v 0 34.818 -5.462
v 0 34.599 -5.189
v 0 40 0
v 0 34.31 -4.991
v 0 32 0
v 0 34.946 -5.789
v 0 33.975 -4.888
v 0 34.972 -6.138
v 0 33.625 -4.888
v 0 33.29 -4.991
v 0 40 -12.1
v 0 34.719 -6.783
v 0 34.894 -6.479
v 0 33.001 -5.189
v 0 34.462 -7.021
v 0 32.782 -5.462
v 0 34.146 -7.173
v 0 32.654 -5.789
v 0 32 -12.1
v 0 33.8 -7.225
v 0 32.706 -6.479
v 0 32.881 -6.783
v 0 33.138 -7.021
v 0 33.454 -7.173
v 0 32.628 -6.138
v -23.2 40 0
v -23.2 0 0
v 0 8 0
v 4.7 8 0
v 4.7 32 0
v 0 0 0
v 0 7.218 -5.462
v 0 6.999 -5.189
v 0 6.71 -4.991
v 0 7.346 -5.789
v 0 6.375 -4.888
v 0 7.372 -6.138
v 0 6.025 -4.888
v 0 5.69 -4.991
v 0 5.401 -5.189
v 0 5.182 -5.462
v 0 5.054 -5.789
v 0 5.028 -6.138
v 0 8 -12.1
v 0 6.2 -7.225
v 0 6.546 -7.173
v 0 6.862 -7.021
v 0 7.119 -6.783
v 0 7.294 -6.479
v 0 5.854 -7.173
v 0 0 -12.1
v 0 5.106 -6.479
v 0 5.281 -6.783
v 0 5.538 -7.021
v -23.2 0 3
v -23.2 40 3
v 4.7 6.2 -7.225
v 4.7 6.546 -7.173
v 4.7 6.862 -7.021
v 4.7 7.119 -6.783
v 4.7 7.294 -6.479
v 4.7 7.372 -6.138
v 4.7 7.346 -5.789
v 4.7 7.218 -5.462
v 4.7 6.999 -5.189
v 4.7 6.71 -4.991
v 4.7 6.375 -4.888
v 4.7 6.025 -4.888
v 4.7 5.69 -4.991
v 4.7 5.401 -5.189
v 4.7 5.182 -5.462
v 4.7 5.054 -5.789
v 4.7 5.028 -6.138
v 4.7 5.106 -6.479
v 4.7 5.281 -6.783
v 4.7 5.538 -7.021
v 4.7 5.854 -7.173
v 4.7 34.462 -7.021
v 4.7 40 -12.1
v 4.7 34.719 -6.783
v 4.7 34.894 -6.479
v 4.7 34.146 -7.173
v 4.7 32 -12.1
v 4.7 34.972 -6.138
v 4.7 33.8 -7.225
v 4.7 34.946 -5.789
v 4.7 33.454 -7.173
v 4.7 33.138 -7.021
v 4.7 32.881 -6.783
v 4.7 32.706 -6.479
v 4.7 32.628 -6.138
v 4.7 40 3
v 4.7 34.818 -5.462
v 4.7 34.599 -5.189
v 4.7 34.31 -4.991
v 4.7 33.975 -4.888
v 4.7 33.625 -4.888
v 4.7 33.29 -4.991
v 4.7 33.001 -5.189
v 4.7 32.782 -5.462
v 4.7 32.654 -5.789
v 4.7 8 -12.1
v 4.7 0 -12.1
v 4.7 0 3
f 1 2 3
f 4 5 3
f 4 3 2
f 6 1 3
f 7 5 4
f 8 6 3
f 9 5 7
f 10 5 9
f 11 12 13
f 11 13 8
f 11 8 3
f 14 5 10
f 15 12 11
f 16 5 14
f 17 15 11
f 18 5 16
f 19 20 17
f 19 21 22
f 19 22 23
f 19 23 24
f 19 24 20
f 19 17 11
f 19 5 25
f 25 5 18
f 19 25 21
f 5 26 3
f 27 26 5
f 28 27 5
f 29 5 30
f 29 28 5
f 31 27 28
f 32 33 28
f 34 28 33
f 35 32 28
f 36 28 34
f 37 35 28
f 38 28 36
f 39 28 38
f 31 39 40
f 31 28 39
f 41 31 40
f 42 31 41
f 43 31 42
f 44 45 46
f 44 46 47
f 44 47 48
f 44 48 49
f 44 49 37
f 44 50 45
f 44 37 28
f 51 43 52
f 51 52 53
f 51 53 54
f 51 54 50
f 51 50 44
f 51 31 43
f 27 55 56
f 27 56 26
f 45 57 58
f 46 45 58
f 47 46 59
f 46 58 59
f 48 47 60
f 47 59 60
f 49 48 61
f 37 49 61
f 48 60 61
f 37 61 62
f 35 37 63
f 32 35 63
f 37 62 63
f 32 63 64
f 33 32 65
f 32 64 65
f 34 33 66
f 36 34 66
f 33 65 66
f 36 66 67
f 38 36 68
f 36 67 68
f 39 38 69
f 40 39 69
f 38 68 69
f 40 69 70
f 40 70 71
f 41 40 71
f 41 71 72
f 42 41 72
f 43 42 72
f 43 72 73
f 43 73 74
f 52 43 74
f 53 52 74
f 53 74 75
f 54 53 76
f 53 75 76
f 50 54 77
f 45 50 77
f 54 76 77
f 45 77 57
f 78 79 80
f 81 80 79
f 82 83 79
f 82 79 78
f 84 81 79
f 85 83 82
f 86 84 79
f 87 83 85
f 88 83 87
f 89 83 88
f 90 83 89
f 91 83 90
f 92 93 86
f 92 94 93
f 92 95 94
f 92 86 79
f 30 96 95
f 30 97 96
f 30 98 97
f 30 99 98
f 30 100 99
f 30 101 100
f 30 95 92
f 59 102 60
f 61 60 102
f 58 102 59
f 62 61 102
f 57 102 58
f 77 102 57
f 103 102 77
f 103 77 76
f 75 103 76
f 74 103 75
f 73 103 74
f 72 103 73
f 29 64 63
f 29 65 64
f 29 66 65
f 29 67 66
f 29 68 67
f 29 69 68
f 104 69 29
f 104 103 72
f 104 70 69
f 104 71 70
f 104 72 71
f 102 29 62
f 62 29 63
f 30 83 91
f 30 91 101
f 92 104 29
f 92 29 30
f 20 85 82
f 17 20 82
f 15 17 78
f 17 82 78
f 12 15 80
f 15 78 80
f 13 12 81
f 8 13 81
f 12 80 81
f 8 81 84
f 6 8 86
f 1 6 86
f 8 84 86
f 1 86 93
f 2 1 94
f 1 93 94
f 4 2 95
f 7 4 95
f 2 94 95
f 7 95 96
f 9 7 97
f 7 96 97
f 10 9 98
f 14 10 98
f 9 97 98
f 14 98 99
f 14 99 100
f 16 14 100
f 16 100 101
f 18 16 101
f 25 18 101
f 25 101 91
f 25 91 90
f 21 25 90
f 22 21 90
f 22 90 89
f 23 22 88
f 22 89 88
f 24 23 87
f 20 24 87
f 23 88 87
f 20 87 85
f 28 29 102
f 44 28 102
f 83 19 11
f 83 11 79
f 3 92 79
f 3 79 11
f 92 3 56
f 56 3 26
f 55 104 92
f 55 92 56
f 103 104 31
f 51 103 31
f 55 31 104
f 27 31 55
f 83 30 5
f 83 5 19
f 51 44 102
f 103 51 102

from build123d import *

# Parameters (mm, degrees)
BOSS_EXTRUDE1_DEPTH = 40
SKETCH2_W           = 12.1
SKETCH2_H           = 24
CUT_EXTRUDE3_DEPTH  = 4.7
SKETCH4_R           = 1.175
CUT_EXTRUDE4_DEPTH  = 4.7


with BuildPart() as part:
    # Sketch1 → Boss-Extrude1 (new body)
    with BuildSketch(Plane(origin=(0, 0, 0), x_dir=(1, 0, 0), z_dir=(0, 1, 0))):
        Polygon((0, 12.1), (4.7, 12.1), (4.7, -3), (-23.2, -3), (-23.2, 0), (0, 0), align=None)
    extrude(amount=BOSS_EXTRUDE1_DEPTH)

    # Sketch2 → Cut-Extrude3 (cut)
    with BuildSketch(Plane(origin=(4.7, 0, 0), x_dir=(0, 0, -1), z_dir=(1, 0, 0))):
        with Locations((6.05, 20)):
            Rectangle(SKETCH2_W, SKETCH2_H)
    extrude(amount=-CUT_EXTRUDE3_DEPTH, mode=Mode.SUBTRACT)

    # Sketch4 → Cut-Extrude4 (cut)
    with BuildSketch(Plane(origin=(4.7, 0, 0), x_dir=(0, 0, -1), z_dir=(1, 0, 0))):
        with Locations((6.05, 33.8)):
            Circle(SKETCH4_R)
        with Locations((6.05, 6.2)):
            Circle(SKETCH4_R)
    extrude(amount=-CUT_EXTRUDE4_DEPTH, mode=Mode.SUBTRACT)


solid = part.part
